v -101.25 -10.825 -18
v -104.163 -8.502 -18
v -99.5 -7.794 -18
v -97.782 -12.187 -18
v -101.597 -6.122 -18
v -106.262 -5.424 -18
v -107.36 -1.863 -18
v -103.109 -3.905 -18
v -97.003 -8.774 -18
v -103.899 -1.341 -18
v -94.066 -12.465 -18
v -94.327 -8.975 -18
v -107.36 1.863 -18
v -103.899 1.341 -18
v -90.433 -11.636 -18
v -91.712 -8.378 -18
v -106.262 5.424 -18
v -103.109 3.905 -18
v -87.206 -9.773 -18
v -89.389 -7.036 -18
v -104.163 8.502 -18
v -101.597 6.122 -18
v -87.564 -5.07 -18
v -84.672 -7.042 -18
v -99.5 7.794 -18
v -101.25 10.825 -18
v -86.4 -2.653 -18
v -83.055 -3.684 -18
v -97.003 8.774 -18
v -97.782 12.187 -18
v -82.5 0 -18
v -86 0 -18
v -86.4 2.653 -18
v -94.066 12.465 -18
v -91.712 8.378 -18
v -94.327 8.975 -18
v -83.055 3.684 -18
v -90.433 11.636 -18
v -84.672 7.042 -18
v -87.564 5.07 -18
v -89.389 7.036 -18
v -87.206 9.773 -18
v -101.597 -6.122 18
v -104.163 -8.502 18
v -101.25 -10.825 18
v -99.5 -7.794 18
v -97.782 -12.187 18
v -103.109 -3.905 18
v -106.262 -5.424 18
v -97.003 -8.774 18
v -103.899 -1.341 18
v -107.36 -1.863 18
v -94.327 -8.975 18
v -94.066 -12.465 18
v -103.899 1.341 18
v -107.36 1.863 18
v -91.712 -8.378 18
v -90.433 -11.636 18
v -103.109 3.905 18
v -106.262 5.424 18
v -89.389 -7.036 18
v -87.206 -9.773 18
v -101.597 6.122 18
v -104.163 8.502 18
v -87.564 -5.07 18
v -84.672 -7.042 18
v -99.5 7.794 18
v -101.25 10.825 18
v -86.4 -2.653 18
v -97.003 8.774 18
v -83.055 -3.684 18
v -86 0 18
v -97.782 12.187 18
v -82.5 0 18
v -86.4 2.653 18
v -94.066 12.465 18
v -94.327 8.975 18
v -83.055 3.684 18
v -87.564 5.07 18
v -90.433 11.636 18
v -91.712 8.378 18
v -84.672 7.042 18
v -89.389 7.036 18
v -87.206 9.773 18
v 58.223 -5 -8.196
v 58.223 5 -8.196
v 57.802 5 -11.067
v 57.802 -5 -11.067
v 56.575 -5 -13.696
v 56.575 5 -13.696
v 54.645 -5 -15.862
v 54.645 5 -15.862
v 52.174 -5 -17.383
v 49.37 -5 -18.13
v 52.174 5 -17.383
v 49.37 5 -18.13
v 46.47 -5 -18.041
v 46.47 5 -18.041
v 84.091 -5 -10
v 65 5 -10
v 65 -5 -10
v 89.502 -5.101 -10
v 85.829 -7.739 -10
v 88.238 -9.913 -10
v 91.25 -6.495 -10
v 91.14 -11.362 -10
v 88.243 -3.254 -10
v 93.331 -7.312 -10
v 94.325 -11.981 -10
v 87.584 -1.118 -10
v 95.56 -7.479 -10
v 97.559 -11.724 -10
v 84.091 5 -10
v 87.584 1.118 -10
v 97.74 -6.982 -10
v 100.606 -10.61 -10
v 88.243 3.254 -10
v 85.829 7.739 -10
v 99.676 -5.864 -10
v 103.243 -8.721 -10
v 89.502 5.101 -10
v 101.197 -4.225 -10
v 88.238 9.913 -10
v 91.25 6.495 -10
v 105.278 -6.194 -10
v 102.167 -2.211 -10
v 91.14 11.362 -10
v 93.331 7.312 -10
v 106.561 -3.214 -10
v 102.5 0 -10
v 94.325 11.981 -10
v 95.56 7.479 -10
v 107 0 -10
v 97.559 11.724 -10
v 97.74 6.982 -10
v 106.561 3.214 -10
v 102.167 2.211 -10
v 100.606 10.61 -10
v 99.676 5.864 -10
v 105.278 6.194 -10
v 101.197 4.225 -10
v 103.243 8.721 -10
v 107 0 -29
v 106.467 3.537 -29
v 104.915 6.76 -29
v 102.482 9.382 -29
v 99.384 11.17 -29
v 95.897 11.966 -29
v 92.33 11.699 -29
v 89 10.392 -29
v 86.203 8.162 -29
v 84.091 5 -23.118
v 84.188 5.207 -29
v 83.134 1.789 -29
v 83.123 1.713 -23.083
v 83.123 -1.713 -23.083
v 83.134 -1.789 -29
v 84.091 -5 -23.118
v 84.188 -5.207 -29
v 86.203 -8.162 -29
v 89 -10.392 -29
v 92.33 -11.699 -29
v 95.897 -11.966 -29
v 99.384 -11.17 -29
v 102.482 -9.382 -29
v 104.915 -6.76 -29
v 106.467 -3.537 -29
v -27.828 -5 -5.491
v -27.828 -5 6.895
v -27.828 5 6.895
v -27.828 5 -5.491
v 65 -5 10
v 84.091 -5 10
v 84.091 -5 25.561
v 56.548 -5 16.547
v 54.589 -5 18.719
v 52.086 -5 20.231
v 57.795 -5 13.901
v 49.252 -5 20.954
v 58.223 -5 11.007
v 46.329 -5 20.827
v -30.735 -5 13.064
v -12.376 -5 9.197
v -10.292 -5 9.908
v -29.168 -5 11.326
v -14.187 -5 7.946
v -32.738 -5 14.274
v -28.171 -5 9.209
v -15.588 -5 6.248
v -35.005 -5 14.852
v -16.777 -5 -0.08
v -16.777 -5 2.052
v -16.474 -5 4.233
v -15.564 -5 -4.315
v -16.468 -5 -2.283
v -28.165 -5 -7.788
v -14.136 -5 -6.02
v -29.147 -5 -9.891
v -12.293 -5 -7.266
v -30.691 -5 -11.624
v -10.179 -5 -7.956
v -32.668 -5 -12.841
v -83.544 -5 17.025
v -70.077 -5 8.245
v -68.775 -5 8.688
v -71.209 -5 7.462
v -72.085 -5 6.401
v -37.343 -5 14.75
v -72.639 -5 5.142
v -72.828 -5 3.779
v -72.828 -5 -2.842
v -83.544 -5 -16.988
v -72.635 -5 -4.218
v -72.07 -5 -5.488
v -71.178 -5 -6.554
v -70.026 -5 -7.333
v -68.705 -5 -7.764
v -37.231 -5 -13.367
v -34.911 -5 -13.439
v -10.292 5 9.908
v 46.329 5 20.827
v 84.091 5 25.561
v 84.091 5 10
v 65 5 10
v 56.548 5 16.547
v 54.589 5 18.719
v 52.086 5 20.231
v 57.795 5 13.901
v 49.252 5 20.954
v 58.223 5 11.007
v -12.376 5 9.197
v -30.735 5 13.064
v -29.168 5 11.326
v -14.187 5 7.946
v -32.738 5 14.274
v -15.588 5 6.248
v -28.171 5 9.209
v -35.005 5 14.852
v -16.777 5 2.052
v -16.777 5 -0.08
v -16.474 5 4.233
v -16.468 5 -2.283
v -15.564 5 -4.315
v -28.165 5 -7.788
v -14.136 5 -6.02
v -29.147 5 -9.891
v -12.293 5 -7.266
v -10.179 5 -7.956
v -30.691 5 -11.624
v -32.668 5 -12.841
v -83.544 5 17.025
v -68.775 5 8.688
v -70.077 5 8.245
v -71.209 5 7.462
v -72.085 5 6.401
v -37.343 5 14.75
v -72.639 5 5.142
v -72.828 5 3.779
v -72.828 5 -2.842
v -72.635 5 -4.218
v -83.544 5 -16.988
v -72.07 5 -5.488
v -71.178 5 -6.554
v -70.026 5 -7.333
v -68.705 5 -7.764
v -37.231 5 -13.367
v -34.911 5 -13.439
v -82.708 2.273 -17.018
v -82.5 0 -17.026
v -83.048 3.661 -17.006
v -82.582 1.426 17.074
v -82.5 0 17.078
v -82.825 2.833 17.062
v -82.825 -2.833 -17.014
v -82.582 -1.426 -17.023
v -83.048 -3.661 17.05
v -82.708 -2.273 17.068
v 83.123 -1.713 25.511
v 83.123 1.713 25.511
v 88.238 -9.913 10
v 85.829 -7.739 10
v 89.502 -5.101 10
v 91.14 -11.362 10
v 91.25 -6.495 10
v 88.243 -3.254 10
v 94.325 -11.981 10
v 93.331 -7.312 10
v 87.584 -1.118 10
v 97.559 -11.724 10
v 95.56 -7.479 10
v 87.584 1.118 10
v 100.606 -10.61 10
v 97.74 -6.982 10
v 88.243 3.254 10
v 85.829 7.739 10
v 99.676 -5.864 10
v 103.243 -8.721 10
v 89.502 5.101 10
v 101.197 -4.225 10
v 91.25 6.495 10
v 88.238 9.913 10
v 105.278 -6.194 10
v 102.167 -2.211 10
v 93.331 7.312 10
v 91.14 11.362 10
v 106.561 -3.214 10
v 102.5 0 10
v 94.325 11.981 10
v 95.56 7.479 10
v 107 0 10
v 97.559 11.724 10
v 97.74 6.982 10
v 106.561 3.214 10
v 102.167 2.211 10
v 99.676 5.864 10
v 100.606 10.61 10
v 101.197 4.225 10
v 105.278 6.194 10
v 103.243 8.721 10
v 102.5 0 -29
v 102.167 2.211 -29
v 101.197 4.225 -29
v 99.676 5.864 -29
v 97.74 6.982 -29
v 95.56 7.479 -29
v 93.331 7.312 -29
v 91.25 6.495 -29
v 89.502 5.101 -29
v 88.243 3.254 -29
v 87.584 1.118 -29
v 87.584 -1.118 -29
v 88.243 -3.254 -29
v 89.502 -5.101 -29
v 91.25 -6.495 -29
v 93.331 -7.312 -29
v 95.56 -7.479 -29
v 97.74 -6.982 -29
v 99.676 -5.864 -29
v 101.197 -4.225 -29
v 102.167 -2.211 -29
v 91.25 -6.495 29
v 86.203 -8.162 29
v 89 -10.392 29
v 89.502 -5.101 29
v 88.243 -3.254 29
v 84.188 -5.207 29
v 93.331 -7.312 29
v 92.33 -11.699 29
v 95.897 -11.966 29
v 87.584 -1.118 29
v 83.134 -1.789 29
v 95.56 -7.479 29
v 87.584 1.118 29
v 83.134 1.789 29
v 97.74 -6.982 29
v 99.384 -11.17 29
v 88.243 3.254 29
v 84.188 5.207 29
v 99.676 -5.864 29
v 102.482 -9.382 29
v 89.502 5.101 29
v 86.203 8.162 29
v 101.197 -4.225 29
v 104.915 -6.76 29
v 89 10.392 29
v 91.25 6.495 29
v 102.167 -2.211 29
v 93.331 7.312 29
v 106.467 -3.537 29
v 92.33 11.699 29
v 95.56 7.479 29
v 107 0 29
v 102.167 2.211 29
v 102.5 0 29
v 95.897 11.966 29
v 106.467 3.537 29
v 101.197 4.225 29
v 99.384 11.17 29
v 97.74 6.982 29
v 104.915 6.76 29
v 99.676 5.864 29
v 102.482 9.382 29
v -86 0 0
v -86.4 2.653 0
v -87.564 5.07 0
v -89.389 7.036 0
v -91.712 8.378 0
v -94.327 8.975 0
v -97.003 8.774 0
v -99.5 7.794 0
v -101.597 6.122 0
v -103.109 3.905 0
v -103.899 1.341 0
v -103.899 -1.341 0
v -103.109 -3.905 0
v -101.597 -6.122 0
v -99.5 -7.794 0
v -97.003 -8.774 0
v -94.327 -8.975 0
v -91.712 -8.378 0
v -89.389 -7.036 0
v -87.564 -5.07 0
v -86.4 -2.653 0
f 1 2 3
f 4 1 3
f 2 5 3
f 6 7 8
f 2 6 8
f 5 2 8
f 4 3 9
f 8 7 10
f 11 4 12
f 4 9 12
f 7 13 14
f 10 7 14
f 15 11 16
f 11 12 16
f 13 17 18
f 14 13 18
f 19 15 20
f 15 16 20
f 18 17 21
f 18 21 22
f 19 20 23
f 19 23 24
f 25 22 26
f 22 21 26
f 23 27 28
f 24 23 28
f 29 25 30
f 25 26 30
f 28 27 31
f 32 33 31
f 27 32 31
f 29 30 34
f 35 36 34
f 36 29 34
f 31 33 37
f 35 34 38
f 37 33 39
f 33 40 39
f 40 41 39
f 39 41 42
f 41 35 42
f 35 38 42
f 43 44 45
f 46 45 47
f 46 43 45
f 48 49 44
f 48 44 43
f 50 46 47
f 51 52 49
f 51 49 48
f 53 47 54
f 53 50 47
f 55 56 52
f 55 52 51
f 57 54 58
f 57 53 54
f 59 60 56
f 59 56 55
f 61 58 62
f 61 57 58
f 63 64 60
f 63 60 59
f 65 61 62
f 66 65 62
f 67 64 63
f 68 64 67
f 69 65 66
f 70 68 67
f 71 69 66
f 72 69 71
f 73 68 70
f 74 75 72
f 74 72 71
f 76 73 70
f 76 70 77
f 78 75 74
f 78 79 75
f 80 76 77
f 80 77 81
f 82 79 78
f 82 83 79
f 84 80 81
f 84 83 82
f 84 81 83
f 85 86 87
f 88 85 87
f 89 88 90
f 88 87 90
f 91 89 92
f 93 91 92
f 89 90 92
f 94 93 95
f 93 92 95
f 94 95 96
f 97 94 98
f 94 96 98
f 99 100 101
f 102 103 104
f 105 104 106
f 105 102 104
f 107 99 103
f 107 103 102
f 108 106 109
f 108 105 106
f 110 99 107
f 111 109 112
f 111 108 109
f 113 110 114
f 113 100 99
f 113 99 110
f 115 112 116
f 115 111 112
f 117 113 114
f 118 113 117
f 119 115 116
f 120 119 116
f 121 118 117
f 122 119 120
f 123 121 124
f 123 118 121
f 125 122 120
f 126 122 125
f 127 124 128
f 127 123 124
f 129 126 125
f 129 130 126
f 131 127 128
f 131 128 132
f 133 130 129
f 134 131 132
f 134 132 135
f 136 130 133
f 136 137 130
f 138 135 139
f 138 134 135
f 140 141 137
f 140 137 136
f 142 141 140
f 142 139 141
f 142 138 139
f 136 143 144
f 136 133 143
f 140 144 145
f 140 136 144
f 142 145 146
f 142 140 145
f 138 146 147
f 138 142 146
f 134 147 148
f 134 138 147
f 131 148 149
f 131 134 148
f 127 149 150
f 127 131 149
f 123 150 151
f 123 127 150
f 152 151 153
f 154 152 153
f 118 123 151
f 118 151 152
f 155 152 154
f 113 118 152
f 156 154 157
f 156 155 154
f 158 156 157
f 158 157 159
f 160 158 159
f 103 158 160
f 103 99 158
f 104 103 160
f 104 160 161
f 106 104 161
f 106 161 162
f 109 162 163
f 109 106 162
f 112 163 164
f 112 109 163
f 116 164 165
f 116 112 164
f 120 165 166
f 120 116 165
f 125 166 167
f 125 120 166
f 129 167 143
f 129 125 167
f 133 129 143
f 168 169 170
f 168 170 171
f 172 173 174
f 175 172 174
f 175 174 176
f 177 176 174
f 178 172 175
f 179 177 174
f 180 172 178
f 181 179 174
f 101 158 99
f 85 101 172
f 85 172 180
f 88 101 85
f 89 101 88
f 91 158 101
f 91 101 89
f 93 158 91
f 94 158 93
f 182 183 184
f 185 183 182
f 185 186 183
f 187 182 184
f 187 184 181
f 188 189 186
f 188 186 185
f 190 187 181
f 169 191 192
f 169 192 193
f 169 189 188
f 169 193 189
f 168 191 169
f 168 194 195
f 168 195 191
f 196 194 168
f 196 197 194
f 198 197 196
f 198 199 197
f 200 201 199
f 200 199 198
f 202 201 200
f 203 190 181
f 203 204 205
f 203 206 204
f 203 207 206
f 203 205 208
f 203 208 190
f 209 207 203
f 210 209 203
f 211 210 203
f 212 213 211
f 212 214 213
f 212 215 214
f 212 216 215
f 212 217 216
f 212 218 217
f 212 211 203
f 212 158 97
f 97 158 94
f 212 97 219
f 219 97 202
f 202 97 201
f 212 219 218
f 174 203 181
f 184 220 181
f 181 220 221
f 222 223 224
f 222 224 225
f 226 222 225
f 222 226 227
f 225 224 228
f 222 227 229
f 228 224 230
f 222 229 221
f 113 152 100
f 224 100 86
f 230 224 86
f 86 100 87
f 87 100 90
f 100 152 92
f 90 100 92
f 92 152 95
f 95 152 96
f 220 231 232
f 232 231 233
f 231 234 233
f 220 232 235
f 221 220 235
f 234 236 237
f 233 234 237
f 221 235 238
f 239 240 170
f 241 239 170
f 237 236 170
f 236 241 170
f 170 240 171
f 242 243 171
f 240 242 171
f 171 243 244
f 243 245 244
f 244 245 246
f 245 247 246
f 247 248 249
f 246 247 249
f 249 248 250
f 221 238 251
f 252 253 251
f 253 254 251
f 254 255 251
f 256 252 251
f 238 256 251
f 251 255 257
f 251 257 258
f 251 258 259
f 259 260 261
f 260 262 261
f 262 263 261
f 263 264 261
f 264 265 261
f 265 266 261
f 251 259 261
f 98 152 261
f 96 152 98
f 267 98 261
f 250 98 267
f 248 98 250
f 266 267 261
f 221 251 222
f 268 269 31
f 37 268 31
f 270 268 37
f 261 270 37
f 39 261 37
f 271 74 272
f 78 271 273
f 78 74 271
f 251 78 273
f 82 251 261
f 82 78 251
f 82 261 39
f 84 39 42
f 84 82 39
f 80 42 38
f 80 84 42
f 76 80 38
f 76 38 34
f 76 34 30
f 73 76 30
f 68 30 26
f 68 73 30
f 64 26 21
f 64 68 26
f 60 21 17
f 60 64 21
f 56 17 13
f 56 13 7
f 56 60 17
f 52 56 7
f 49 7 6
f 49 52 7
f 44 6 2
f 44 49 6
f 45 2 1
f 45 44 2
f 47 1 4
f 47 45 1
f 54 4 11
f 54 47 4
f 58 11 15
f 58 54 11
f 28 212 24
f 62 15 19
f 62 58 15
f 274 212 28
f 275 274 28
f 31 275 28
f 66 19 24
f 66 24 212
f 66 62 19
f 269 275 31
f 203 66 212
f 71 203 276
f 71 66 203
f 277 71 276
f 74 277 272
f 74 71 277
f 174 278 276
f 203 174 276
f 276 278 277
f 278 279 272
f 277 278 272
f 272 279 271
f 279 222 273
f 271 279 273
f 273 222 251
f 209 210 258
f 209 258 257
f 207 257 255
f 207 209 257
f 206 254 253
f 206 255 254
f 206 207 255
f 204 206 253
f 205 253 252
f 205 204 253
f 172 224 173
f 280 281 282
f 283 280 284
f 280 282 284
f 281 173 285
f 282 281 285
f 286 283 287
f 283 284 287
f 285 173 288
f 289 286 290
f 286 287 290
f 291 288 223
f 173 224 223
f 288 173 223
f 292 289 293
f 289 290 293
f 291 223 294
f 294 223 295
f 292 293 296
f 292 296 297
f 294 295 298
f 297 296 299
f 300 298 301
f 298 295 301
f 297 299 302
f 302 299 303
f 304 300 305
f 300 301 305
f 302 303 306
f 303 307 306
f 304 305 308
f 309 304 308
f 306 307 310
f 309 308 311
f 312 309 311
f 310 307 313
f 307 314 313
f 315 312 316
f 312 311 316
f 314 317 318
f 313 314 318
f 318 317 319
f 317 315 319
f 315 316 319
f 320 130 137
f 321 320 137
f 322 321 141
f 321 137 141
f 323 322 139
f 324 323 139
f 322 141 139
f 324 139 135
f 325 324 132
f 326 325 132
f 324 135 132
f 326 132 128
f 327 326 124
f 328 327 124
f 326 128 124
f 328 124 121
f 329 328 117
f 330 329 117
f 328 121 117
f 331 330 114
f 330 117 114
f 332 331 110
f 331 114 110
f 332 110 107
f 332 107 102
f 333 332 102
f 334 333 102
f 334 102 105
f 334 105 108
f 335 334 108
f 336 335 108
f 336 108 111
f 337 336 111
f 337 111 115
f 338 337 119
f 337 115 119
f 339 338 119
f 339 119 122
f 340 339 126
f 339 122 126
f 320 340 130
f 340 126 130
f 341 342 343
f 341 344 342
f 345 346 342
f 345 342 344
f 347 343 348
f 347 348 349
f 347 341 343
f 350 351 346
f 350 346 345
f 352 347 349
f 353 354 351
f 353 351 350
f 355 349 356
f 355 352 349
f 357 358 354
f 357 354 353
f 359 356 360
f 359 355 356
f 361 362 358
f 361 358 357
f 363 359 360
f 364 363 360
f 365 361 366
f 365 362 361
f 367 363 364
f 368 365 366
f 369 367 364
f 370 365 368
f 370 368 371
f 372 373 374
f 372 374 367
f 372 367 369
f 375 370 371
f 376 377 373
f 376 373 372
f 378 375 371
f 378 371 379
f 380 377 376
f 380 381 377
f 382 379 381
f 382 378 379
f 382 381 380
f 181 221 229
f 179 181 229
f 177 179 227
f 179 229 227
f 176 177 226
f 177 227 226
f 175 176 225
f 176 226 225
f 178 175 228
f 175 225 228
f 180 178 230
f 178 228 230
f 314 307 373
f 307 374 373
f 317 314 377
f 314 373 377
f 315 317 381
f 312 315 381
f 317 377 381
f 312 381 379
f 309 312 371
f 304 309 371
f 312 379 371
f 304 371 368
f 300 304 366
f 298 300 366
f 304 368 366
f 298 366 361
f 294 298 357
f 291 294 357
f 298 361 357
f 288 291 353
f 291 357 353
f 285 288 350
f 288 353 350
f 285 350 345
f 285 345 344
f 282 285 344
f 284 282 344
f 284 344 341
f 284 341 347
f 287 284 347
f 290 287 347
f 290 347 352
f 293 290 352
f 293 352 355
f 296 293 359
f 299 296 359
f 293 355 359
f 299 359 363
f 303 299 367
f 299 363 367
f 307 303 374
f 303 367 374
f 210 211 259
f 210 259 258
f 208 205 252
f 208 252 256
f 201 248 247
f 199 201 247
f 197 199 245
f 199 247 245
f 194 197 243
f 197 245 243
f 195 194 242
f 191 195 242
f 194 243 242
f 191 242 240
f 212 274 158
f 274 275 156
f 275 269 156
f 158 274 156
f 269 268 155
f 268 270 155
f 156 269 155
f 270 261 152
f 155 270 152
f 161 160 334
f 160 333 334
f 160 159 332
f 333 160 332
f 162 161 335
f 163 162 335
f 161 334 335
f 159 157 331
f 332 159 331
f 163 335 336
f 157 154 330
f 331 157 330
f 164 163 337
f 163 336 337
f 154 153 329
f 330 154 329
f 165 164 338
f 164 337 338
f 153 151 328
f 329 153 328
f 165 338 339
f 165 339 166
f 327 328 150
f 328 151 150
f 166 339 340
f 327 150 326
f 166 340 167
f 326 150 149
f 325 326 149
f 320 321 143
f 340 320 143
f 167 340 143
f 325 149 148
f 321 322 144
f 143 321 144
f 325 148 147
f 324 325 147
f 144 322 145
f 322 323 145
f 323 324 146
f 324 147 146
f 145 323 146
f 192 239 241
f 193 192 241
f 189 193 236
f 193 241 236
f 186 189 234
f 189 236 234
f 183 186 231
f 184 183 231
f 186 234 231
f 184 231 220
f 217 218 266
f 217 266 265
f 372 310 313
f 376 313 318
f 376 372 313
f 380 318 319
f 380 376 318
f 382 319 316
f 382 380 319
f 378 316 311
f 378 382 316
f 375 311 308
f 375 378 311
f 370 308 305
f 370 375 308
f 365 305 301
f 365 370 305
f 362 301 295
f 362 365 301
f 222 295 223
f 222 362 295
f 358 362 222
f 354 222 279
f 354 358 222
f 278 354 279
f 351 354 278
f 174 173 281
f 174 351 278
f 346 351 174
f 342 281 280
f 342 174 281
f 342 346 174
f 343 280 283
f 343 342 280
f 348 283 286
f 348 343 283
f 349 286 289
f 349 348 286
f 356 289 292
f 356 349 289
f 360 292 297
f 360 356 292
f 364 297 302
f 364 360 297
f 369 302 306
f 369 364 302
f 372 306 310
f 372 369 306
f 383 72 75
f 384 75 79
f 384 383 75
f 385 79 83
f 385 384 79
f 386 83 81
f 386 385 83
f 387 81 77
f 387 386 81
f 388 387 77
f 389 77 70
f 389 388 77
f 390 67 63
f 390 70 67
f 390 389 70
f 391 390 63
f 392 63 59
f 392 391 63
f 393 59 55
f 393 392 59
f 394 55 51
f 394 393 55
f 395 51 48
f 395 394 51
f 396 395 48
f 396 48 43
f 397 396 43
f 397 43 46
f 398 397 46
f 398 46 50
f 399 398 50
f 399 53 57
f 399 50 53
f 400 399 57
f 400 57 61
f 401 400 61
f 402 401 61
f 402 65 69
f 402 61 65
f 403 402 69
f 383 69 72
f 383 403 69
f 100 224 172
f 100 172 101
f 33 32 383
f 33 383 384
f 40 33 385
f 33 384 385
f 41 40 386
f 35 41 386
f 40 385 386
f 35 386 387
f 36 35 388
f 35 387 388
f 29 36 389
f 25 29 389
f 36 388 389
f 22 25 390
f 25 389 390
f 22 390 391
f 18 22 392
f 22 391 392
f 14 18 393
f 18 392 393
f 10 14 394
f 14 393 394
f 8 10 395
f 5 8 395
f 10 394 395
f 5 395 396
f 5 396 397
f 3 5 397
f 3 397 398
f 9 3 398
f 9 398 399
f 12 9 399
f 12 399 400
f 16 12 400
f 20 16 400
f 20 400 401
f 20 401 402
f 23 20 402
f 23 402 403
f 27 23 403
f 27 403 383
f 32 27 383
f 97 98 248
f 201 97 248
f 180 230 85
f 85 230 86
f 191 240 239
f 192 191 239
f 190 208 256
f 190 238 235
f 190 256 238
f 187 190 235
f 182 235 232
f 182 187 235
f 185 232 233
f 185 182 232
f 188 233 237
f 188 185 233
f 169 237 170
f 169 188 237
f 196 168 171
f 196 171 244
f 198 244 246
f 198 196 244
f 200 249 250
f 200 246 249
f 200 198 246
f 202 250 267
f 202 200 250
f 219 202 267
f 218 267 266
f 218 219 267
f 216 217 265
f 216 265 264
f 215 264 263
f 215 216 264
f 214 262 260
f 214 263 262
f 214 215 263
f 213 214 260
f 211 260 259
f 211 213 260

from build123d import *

# Parameters (mm, degrees)
SKETCH1_R           = 9
BOSS_EXTRUDE2_DEPTH = 18
SKETCH2_R           = 7.5
BOSS_EXTRUDE3_DEPTH = 29
BOSS_EXTRUDE5_DEPTH = 5
SKETCH7_R           = 12.5
BOSS_EXTRUDE6_DEPTH = 18
SKETCH8_R           = 12
BOSS_EXTRUDE7_DEPTH = 29
SKETCH9_R           = 9
SKETCH9_R_2         = 7.5
CUT_EXTRUDE1_DEPTH  = 29
SKETCH10_W          = 42
SKETCH10_H          = 20
CUT_EXTRUDE2_DEPTH  = 29
CUT_EXTRUDE3_DEPTH  = 29


with BuildPart() as part:
    # Sketch1 → Boss-Extrude2 (new body, symmetric)
    with BuildSketch(Plane.XY):
        with Locations((-95, 0)):
            Circle(SKETCH1_R)
    extrude(amount=BOSS_EXTRUDE2_DEPTH, both=True)



with BuildPart() as body_2:
    # Sketch2 → Boss-Extrude3 (new body, symmetric)
    with BuildSketch(Plane.XY):
        with Locations((95, 0)):
            Circle(SKETCH2_R)
    extrude(amount=BOSS_EXTRUDE3_DEPTH, both=True)


with BuildPart() as body_3:
    # Sketch5 → Boss-Extrude5 (new body, symmetric)
    with BuildSketch(Plane(origin=(0, 0, 0), x_dir=(1, 0, 0), z_dir=(0, 1, 0))):
        Polygon((-86, -16.9), (-86, 16.897851431), (87.5, 23.242786401), (87.5, -25.734348151), align=None)
    extrude(amount=BOSS_EXTRUDE5_DEPTH, both=True)


with BuildPart() as part_1:
    add(part.part)

    add(body_3.part)  # Boss-Extrude6 merges body 3
    # Sketch7 → Boss-Extrude6 (add, symmetric)
    with BuildSketch(Plane.XY):
        with Locations((-95, 0)):
            Circle(SKETCH7_R)
    extrude(amount=BOSS_EXTRUDE6_DEPTH, both=True)


    add(body_2.part)  # Boss-Extrude7 merges body 2
    # Sketch8 → Boss-Extrude7 (add, symmetric)
    with BuildSketch(Plane.XY):
        with Locations((95, 0)):
            Circle(SKETCH8_R)
    extrude(amount=BOSS_EXTRUDE7_DEPTH, both=True)

    # Sketch9 → Cut-Extrude1 (cut, symmetric)
    with BuildSketch(Plane.XY):
        with Locations((-95, 0)):
            Circle(SKETCH9_R)
        with Locations((95, 0)):
            Circle(SKETCH9_R_2)
    extrude(amount=CUT_EXTRUDE1_DEPTH, both=True, mode=Mode.SUBTRACT)

    # Sketch10 → Cut-Extrude2 (cut, symmetric)
    with BuildSketch(Plane(origin=(0, 5, 0), x_dir=(1, 0, 0), z_dir=(0, 1, 0))):
        with Locations((86, 0)):
            Rectangle(SKETCH10_W, SKETCH10_H)
    extrude(amount=CUT_EXTRUDE2_DEPTH, both=True, mode=Mode.SUBTRACT)

    # Sketch11 → Cut-Extrude3 (cut, symmetric)
    with BuildSketch(Plane(origin=(0, 5, 0), x_dir=(1, 0, 0), z_dir=(0, 1, 0))):
        with BuildLine():
            Line((-72.828382605, 2.841663292), (-72.828382605, -3.778949024))
            ThreePointArc((-72.828382605, -3.778949024), (-71.684142411, -6.96220464), (-68.775136079, -8.688496647))
            Line((-68.775136079, -8.688496647), (-37.343188163, -14.749809861))
            ThreePointArc((-37.343188163, -14.749809861), (-30.73517362, -13.063749355), (-27.828382605, -6.894533665))
            Line((-27.828382605, -6.894533665), (-27.828382605, 5.49132779))
            ThreePointArc((-27.828382605, 5.49132779), (-30.691131262, 11.623916855), (-37.230544764, 13.367490642))
            Line((-37.230544764, 13.367490642), (-68.704733954, 7.764265074))
            ThreePointArc((-68.704733954, 7.764265074), (-71.66125077, 6.052445381), (-72.828382605, 2.841663292))
        make_face()
        with BuildLine():
            Line((-16.777023504, 0.080024287), (-16.777023504, -2.052490903))
            ThreePointArc((-16.777023504, -2.052490903), (-14.946239194, -7.145699888), (-10.291829062, -9.907767099))
            Line((-10.291829062, -9.907767099), (46.329469548, -20.826575771))
            ThreePointArc((46.329469548, -20.826575771), (54.589487728, -18.719000138), (58.222976496, -11.007480526))
            Line((58.222976496, -11.007480526), (58.222976496, 8.196063057))
            ThreePointArc((58.222976496, 8.196063057), (54.644540675, 15.861799388), (46.470273797, 18.041266623))
            Line((46.470273797, 18.041266623), (-10.179185663, 7.956187139))
            ThreePointArc((-10.179185663, 7.956187139), (-14.909612569, 5.21727563), (-16.777023504, 0.080024287))
        make_face()
    extrude(amount=CUT_EXTRUDE3_DEPTH, both=True, mode=Mode.SUBTRACT)


solid = part_1.part
